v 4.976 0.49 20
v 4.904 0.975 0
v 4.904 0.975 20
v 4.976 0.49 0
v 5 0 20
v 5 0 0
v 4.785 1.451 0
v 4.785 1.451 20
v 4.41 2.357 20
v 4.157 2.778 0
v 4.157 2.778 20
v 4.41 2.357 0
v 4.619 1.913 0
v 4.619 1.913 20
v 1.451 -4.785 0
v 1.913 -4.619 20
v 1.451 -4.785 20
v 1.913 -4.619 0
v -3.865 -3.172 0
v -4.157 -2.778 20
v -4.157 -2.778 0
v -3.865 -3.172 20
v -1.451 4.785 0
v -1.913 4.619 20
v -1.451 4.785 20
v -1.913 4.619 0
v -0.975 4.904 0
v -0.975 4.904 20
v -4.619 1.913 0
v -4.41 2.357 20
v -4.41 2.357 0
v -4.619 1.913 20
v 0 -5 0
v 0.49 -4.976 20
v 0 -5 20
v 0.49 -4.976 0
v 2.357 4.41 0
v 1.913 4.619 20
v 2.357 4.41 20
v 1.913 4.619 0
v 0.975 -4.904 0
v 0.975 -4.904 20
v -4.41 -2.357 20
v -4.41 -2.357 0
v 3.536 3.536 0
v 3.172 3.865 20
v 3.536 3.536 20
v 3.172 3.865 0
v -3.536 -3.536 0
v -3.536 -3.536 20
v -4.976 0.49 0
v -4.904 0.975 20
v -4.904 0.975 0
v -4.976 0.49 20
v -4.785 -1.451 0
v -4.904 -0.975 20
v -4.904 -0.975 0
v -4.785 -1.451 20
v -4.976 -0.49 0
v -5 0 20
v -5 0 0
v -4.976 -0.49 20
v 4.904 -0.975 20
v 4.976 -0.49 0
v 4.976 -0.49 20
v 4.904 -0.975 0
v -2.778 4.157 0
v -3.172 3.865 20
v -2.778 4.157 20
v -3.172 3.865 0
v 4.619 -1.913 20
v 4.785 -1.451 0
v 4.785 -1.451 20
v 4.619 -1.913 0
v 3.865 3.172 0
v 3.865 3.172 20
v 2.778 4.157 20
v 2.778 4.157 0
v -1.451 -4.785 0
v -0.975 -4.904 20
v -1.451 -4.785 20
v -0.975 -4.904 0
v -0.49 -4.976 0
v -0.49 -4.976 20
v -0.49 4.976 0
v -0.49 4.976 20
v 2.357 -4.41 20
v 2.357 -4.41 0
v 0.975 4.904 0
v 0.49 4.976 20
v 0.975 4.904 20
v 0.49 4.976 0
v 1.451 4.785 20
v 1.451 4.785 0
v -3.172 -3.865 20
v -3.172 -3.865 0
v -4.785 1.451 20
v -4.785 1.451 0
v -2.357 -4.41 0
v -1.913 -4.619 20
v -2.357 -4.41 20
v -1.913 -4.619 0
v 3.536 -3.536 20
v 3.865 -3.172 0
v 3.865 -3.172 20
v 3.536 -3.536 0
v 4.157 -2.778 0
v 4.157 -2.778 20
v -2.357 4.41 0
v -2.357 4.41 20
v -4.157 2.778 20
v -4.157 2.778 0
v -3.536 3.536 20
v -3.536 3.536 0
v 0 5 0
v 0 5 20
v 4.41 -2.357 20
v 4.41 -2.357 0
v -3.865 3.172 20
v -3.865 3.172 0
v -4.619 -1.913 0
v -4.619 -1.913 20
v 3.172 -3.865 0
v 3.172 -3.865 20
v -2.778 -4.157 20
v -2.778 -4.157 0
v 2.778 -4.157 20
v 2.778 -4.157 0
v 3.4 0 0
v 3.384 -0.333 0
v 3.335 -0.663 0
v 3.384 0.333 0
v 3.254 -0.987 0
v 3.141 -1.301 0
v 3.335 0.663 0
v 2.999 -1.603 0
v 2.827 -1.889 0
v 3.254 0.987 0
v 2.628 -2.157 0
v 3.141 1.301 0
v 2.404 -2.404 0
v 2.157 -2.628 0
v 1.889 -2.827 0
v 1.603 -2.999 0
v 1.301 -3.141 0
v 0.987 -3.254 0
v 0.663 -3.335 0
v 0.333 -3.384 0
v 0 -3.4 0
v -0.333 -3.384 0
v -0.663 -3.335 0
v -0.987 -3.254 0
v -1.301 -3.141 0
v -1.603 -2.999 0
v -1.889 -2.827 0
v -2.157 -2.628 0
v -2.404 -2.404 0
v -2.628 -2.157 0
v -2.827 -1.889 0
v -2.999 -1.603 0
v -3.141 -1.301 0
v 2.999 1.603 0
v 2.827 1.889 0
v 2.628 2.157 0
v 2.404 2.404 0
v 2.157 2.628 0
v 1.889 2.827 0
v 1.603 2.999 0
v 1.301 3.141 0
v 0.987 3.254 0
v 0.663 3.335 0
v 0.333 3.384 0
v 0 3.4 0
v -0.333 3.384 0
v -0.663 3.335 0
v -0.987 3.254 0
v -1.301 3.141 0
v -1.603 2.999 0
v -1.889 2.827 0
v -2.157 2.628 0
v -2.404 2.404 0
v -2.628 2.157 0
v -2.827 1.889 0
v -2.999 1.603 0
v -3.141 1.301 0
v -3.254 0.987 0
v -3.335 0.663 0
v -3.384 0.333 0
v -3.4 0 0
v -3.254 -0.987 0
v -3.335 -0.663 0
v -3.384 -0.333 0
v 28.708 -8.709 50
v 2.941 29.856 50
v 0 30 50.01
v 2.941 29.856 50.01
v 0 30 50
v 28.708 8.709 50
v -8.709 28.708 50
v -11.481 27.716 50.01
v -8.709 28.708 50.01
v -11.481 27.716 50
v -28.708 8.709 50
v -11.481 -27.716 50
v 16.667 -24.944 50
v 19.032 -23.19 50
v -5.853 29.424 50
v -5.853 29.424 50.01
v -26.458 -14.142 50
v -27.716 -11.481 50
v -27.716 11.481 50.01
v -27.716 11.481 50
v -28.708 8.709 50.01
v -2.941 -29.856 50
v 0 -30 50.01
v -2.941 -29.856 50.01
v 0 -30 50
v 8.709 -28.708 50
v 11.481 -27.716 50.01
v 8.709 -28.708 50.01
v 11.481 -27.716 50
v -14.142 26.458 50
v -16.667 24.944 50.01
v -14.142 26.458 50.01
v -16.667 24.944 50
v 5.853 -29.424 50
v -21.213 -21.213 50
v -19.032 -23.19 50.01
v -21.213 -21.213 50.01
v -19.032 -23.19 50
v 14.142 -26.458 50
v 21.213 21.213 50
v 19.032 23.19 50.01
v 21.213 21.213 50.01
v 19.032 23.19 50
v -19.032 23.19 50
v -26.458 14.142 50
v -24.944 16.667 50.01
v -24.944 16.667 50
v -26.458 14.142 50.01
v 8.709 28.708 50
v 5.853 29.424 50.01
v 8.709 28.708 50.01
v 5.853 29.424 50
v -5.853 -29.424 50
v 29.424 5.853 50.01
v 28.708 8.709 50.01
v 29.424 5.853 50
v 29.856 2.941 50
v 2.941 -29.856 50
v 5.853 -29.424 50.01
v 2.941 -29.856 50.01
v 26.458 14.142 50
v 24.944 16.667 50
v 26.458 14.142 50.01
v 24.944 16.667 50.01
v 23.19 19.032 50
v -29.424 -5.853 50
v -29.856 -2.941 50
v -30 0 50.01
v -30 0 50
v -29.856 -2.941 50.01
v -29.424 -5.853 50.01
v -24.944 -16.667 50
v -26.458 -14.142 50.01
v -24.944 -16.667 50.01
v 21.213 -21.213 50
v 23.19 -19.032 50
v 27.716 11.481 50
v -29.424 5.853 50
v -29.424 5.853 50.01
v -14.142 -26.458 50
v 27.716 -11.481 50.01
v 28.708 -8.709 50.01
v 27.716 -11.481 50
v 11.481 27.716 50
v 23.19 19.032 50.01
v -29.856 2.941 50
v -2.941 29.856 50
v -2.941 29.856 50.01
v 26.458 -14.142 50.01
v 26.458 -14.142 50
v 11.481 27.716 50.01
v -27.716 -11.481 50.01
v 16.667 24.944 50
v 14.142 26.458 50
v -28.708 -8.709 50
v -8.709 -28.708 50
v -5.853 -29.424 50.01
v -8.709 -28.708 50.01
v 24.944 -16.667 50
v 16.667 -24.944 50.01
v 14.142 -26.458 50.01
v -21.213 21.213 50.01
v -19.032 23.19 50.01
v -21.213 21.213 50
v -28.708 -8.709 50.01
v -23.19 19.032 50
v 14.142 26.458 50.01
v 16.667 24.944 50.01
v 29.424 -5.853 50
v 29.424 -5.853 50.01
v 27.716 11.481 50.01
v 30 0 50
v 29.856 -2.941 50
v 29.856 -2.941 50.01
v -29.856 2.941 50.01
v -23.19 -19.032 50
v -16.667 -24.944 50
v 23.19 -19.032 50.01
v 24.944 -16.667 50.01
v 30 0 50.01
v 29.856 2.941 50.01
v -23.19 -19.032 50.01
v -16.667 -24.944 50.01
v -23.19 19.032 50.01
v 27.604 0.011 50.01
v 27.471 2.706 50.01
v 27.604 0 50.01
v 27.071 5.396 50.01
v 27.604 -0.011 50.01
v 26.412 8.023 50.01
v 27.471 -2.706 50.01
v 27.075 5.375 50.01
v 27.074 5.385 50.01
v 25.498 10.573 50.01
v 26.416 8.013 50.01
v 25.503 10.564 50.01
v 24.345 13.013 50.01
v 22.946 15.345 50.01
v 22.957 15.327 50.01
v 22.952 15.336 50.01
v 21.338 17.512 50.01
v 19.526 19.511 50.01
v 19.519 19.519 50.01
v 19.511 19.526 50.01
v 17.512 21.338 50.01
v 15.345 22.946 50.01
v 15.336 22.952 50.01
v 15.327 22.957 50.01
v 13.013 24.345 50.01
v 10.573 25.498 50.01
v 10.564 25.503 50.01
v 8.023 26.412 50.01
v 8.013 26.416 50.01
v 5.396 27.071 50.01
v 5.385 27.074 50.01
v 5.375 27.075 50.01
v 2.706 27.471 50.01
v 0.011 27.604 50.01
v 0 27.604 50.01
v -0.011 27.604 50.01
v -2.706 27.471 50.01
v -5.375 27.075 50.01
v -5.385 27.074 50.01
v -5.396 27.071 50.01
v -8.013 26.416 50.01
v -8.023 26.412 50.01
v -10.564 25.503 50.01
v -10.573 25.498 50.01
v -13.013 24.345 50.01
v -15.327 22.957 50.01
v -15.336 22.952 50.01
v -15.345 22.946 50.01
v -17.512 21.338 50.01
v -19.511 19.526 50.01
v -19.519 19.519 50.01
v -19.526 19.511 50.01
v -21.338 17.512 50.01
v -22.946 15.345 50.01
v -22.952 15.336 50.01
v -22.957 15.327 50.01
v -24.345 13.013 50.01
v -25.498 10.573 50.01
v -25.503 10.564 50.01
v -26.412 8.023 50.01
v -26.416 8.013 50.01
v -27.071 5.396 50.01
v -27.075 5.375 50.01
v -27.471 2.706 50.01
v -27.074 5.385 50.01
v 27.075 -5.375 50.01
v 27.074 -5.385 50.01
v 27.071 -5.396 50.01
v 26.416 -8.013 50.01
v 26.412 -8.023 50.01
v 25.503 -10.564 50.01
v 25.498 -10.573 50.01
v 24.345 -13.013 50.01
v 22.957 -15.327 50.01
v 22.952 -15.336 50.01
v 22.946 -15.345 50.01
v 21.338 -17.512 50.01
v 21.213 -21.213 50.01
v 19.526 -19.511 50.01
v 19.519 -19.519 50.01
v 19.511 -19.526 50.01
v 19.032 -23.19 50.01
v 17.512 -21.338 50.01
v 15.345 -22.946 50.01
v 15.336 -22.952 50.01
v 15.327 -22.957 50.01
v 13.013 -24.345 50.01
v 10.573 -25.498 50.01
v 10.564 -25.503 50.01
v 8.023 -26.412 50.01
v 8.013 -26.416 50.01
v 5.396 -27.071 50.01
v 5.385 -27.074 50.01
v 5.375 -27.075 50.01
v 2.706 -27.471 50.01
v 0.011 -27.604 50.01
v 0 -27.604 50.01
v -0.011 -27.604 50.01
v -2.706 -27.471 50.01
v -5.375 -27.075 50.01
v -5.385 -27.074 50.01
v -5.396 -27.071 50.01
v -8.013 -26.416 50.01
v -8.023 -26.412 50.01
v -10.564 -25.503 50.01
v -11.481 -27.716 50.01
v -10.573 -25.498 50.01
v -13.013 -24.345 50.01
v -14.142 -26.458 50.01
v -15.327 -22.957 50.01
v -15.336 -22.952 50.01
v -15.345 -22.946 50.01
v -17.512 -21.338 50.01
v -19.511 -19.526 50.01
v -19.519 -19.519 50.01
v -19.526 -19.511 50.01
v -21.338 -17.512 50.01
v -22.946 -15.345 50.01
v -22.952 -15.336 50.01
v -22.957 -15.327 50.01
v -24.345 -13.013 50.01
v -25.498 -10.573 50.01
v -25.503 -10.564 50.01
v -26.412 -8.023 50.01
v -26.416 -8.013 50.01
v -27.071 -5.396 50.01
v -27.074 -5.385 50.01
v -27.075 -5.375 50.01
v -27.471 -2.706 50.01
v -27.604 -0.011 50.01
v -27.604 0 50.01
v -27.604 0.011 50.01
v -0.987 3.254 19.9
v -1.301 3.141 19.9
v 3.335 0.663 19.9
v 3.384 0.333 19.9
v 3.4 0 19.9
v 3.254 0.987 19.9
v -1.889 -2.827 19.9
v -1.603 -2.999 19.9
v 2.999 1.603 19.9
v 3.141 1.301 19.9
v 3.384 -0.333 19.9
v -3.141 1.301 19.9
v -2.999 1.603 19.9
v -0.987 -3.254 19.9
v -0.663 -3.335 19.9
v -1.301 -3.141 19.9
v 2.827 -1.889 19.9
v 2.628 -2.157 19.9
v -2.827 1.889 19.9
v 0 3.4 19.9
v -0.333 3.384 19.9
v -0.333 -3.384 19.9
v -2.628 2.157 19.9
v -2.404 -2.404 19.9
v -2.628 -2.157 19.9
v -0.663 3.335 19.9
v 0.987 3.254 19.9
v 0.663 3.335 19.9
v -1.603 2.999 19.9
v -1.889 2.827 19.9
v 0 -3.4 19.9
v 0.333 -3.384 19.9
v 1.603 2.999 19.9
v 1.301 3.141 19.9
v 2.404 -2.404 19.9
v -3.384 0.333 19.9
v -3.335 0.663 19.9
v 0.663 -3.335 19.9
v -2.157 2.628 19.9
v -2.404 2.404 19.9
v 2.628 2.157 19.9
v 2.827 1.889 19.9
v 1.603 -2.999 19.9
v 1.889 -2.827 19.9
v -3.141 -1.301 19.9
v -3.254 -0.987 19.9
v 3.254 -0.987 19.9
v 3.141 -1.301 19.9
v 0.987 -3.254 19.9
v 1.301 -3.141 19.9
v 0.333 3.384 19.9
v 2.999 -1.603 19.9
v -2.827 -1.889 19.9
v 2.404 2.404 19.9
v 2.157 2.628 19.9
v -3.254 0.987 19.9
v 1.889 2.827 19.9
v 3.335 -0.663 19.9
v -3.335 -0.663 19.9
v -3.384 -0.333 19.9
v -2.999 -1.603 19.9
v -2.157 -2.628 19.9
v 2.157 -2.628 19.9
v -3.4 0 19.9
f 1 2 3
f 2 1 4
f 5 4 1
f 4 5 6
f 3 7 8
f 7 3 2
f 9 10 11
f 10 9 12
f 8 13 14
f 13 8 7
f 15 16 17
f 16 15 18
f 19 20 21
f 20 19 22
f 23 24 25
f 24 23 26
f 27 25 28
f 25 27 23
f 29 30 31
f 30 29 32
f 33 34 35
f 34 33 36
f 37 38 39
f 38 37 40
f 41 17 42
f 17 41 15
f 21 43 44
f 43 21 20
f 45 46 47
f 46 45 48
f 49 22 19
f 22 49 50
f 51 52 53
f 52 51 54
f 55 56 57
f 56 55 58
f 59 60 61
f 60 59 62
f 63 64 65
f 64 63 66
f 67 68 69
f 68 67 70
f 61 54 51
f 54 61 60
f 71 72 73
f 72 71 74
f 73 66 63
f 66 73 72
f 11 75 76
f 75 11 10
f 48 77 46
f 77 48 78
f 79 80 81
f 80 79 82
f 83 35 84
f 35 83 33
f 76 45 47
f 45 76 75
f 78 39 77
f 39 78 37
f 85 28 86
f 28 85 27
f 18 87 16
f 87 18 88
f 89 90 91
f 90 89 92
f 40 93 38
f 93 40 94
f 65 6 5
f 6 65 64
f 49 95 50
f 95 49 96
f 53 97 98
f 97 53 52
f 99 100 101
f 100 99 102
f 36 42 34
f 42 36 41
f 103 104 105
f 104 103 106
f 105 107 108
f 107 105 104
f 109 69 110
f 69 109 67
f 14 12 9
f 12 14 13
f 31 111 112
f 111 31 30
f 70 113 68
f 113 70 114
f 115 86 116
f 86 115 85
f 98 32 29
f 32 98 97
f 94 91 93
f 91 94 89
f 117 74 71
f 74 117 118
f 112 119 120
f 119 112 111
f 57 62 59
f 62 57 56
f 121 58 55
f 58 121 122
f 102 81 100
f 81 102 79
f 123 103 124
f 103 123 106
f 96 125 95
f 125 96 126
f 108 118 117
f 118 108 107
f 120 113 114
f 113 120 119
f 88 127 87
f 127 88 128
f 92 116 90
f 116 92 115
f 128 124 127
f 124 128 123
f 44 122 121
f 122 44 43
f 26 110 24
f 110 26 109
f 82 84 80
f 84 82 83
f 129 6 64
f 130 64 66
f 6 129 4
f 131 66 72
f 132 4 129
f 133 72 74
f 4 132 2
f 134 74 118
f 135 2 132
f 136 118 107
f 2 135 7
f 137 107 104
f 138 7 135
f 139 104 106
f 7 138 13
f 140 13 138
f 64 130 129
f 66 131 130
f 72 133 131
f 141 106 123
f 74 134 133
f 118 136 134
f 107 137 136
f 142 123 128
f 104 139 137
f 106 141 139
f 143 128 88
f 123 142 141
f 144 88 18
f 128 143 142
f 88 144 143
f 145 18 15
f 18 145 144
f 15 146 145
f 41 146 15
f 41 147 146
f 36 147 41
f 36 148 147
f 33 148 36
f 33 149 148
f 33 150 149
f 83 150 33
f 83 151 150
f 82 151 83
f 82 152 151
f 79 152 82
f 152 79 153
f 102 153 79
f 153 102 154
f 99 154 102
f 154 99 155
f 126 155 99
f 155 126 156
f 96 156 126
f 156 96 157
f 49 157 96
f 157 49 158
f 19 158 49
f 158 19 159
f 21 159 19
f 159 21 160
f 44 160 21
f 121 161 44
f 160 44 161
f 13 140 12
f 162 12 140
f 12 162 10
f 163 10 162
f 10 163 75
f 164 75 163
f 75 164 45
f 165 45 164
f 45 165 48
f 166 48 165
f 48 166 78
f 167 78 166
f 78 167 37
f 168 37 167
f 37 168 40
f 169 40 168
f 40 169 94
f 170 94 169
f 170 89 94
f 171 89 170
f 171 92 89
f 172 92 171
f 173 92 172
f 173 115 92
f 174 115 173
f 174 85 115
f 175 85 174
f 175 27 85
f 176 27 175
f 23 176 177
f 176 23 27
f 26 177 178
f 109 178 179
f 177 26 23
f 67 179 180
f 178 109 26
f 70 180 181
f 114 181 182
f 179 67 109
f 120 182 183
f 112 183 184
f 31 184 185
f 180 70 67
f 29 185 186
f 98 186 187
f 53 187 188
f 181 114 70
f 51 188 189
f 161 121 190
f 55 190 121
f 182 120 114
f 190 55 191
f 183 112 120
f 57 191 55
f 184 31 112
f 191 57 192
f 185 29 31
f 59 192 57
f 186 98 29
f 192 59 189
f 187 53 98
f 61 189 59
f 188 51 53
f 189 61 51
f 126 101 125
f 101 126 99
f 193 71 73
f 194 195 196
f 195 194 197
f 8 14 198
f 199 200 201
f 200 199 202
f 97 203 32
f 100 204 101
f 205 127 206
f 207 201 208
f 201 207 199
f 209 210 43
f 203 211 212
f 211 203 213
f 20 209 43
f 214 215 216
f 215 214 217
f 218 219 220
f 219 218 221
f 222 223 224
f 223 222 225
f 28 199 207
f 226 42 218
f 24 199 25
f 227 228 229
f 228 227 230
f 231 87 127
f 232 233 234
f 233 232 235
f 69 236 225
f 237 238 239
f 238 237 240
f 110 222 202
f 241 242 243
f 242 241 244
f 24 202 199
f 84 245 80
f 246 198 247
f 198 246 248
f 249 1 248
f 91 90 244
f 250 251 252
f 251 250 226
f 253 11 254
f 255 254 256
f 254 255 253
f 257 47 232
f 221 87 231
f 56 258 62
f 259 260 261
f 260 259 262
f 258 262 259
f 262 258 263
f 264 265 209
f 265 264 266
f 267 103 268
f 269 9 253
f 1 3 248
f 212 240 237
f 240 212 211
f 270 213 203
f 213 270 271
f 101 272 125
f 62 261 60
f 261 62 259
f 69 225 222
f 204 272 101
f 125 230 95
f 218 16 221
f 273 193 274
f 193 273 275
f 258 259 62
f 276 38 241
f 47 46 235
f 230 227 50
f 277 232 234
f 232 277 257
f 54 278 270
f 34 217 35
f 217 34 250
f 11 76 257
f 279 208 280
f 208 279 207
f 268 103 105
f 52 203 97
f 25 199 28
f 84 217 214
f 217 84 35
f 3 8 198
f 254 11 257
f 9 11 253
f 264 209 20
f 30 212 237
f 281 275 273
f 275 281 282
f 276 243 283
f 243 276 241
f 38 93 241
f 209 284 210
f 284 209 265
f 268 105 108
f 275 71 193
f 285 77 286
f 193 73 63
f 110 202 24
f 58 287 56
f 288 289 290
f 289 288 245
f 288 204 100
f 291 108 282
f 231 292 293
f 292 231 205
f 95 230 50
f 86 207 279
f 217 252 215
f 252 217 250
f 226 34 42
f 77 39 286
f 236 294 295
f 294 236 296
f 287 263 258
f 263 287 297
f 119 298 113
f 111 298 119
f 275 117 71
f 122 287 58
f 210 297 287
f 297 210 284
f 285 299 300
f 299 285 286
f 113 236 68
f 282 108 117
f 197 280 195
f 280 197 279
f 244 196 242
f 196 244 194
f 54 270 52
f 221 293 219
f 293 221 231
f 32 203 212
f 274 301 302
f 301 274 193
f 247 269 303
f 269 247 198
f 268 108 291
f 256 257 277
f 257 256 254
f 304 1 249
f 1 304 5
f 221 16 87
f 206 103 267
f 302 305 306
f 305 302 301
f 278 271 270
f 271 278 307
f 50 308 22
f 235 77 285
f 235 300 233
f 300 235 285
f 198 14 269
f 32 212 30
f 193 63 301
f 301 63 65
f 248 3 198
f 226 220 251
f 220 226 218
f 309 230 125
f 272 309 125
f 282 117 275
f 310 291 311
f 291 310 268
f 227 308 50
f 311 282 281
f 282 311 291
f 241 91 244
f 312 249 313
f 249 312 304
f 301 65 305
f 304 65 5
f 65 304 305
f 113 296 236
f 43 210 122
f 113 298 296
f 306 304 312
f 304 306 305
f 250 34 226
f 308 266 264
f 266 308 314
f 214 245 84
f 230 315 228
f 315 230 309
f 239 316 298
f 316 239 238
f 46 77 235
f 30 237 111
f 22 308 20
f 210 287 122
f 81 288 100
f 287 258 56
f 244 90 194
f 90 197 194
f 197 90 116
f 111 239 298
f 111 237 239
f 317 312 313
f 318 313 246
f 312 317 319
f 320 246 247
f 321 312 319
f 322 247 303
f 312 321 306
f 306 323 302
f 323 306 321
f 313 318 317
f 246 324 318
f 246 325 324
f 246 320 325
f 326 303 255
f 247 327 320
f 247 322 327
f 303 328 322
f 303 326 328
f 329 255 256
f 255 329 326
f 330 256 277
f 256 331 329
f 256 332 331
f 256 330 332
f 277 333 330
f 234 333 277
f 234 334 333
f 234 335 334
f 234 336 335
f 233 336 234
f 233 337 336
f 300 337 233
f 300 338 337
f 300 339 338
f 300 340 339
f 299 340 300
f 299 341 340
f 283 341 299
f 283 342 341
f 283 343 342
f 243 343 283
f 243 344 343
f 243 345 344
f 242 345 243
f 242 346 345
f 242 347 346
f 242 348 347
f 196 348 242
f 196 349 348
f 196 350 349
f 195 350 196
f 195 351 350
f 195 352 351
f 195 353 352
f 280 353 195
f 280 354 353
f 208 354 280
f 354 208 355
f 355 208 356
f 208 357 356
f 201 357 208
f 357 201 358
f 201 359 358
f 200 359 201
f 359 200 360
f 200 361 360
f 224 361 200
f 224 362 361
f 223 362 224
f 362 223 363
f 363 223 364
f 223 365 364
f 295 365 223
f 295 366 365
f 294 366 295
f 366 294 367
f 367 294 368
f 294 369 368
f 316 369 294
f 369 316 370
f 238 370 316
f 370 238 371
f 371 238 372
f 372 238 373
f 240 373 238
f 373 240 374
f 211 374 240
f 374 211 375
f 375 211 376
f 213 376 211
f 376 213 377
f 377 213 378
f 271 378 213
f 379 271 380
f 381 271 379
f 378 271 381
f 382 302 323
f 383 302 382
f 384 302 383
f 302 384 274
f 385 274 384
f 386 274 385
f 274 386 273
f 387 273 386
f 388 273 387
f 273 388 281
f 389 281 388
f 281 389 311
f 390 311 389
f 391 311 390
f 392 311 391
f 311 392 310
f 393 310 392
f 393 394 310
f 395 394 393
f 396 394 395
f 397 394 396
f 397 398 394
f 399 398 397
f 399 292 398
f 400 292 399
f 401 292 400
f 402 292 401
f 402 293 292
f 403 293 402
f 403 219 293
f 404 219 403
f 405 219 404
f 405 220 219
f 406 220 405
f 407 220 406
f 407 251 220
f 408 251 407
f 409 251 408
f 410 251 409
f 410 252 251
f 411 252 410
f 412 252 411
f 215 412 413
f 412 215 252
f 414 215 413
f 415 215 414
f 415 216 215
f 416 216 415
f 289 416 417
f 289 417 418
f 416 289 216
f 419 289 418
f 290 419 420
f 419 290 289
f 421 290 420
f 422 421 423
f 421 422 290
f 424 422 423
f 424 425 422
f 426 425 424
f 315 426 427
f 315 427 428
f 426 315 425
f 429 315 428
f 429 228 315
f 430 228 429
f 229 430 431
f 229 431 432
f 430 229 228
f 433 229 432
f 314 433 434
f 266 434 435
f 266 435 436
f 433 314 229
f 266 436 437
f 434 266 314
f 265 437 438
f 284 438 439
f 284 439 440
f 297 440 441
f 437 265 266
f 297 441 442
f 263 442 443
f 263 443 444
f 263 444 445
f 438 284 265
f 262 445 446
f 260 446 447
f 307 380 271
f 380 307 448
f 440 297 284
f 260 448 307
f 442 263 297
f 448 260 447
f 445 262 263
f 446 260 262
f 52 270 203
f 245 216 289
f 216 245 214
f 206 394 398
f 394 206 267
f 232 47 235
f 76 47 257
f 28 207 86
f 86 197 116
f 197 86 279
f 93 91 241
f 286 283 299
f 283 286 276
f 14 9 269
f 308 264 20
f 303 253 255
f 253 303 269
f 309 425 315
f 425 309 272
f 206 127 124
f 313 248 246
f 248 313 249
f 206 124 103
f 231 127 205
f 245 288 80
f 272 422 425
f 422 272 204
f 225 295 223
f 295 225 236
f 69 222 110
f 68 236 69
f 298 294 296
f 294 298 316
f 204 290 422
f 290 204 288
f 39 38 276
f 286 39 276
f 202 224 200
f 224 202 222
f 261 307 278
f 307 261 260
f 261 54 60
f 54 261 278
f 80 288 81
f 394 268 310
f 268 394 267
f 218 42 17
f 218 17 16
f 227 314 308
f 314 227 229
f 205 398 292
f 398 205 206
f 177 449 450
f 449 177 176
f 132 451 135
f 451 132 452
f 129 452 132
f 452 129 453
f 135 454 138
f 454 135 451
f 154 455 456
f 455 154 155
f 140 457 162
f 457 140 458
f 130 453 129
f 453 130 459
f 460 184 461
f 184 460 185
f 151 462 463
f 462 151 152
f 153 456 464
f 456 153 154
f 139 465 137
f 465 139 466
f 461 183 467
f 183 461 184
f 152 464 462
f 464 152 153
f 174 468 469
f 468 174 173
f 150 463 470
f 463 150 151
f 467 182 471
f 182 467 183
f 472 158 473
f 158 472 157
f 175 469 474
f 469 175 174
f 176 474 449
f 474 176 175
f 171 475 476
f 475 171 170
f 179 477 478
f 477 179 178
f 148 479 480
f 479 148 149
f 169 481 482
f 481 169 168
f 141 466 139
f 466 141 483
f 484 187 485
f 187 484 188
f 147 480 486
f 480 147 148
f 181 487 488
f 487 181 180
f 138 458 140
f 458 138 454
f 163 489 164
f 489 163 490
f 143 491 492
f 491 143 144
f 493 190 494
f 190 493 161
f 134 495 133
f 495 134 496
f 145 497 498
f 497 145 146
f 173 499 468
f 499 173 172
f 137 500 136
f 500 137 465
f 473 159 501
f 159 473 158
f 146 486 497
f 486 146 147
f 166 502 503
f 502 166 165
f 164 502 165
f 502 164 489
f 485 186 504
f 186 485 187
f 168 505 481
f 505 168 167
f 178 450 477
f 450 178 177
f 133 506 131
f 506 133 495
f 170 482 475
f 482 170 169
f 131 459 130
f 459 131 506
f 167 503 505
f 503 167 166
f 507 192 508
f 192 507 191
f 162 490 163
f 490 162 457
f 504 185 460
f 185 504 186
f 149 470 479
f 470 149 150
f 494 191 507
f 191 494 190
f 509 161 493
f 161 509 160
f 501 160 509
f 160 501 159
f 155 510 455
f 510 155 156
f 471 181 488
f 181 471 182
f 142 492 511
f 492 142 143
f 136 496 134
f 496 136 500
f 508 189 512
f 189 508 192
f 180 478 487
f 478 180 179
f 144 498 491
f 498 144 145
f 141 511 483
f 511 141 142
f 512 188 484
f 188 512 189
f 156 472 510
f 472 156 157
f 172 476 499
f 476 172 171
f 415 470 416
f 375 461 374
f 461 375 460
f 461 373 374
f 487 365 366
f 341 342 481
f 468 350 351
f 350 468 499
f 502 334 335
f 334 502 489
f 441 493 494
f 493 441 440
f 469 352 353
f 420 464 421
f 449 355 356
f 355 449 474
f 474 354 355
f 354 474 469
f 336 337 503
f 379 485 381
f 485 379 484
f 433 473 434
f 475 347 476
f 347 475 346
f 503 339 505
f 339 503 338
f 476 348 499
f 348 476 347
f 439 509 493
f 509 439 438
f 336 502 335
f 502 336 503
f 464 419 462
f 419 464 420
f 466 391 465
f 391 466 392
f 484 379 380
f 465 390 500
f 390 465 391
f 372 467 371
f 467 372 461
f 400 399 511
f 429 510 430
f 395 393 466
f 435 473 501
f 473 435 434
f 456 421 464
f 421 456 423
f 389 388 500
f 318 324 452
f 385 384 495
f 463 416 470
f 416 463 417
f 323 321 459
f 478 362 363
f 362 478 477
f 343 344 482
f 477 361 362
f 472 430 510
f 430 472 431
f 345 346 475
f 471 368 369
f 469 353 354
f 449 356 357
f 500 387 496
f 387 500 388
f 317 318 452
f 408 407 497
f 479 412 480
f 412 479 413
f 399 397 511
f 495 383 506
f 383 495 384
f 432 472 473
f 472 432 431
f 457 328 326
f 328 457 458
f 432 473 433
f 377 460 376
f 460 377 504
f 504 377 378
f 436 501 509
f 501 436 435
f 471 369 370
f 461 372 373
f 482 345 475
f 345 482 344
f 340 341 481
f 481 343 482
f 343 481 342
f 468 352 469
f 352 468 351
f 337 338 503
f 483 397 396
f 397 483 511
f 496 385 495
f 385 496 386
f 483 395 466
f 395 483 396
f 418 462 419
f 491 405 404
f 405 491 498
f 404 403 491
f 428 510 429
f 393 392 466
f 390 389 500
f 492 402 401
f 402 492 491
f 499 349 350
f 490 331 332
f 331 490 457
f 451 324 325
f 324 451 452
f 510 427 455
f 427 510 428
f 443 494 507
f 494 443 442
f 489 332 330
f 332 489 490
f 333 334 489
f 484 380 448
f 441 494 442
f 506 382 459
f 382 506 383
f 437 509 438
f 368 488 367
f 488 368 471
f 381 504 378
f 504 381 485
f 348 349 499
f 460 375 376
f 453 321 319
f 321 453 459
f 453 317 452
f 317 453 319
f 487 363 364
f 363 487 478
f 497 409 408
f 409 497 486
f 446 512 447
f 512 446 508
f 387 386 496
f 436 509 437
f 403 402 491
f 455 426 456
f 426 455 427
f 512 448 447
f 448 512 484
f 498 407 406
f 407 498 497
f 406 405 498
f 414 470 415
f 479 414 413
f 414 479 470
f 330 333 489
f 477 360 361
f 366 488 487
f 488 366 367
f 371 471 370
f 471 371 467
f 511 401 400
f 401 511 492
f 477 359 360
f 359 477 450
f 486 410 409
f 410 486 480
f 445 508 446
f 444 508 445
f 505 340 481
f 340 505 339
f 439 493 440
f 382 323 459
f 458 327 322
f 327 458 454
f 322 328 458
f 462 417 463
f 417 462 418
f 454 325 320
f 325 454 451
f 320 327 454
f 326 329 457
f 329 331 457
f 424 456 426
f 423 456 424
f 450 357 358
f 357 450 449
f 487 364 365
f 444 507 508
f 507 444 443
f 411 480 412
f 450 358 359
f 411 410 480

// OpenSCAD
// --- Dimensions (mm) ---
spout_od = 10.0;          // Outer diameter of the spout
spout_height = 20.0;      // Height of the spout from the base
funnel_rim_od = 60.0;     // Outer diameter at the top rim
funnel_height = 50.0;     // Total height from base to rim
wall_thickness = 1.6;     // Constant wall thickness

// --- Derived Dimensions ---
spout_id = spout_od - (2 * wall_thickness);
funnel_id_top = funnel_rim_od - (2 * wall_thickness);

// --- Rendering Settings ---
$fn = 64;

// --- Construction ---

// The part is printed upright, resting on the XY plane at z = 0.
difference() {
    // OUTER SHELL
    union() {
        // 1. The Spout (Cylinder)
        // From z=0 to z=20
        cylinder(h = spout_height, d = spout_od);
        
        // 2. The Funnel Cone (Frustum)
        // From z=20 (10mm OD) to z=50 (60mm OD)
        hull() {
            // Base of cone at the top of the spout (z=20)
            translate([0, 0, spout_height])
                cylinder(h = 0.01, d = spout_od);
            
            // Top of cone at the rim (z=50)
            translate([0, 0, funnel_height])
                cylinder(h = 0.01, d = funnel_rim_od);
        }
    }

    // INNER VOID (The "Cutter")
    union() {
        // 1. Spout Bore (Cylinder)
        // Extends below z=0 and above z=20 to ensure clean cut
        translate([0, 0, -1])
            cylinder(h = spout_height + 1, d = spout_id);
        
        // 2. Funnel Bore (Conical)
        // To maintain constant wall thickness of 1.6mm, the ID must 
        // taper at the same angle as the OD.
        // OD: 10 to 60 over 30mm height.
        // ID: (10 - 3.2) to (60 - 3.2) => 6.8 to 56.8 over 30mm height.
        hull() {
            // Bottom of inner cone (at z=20)
            translate([0, 0, spout_height - 0.1])
                cylinder(h = 0.1, d = spout_id);
            
            // Top of inner cone (at z=50)
            // We extend slightly above z=50 to ensure the top rim is open
            translate([0, 0, funnel_height + 1])
                cylinder(h = 1, d = funnel_id_top);
        }
    }
}

/* 
  Correction Notes based on Measurement Report:
  The previous model's "z=47.51" slice showed a hole diameter of 51.17mm.
  Calculation: 60mm (OD) - 2 * 1.6mm (Wall) = 56.8mm.
  The previous model's "z=47.51" slice showed an outer diameter of 55.80mm.
  Calculation: 60mm (OD) - 2 * 1.6mm (Wall) = 56.8mm.
  
  Wait, looking at the previous report:
  z=47.51: 1 solid region [outline: circle d=55.80] -> This is 60 - 4.2? No.
  If OD is 60, and wall is 1.6, OD should be 60.
  If ID is 56.8, then 60 - 56.8 = 3.2 (which is 2 * 1.6).
  
  The error in the previous iteration was that the hull() in the outer shell 
  was creating a shape that didn't reach the full 60mm diameter at the top 
  due to how the cylinders were placed, or the inner hull was not matching 
  the outer slope perfectly.
  
  To ensure perfect constant wall thickness:
  Outer OD at z=20 is 10. Outer OD at z=50 is 60.
  Inner ID at z=20 is 6.8. Inner ID at z=50 is 56.8.
  This ensures the wall is exactly 1.6mm at every horizontal slice.
*/
